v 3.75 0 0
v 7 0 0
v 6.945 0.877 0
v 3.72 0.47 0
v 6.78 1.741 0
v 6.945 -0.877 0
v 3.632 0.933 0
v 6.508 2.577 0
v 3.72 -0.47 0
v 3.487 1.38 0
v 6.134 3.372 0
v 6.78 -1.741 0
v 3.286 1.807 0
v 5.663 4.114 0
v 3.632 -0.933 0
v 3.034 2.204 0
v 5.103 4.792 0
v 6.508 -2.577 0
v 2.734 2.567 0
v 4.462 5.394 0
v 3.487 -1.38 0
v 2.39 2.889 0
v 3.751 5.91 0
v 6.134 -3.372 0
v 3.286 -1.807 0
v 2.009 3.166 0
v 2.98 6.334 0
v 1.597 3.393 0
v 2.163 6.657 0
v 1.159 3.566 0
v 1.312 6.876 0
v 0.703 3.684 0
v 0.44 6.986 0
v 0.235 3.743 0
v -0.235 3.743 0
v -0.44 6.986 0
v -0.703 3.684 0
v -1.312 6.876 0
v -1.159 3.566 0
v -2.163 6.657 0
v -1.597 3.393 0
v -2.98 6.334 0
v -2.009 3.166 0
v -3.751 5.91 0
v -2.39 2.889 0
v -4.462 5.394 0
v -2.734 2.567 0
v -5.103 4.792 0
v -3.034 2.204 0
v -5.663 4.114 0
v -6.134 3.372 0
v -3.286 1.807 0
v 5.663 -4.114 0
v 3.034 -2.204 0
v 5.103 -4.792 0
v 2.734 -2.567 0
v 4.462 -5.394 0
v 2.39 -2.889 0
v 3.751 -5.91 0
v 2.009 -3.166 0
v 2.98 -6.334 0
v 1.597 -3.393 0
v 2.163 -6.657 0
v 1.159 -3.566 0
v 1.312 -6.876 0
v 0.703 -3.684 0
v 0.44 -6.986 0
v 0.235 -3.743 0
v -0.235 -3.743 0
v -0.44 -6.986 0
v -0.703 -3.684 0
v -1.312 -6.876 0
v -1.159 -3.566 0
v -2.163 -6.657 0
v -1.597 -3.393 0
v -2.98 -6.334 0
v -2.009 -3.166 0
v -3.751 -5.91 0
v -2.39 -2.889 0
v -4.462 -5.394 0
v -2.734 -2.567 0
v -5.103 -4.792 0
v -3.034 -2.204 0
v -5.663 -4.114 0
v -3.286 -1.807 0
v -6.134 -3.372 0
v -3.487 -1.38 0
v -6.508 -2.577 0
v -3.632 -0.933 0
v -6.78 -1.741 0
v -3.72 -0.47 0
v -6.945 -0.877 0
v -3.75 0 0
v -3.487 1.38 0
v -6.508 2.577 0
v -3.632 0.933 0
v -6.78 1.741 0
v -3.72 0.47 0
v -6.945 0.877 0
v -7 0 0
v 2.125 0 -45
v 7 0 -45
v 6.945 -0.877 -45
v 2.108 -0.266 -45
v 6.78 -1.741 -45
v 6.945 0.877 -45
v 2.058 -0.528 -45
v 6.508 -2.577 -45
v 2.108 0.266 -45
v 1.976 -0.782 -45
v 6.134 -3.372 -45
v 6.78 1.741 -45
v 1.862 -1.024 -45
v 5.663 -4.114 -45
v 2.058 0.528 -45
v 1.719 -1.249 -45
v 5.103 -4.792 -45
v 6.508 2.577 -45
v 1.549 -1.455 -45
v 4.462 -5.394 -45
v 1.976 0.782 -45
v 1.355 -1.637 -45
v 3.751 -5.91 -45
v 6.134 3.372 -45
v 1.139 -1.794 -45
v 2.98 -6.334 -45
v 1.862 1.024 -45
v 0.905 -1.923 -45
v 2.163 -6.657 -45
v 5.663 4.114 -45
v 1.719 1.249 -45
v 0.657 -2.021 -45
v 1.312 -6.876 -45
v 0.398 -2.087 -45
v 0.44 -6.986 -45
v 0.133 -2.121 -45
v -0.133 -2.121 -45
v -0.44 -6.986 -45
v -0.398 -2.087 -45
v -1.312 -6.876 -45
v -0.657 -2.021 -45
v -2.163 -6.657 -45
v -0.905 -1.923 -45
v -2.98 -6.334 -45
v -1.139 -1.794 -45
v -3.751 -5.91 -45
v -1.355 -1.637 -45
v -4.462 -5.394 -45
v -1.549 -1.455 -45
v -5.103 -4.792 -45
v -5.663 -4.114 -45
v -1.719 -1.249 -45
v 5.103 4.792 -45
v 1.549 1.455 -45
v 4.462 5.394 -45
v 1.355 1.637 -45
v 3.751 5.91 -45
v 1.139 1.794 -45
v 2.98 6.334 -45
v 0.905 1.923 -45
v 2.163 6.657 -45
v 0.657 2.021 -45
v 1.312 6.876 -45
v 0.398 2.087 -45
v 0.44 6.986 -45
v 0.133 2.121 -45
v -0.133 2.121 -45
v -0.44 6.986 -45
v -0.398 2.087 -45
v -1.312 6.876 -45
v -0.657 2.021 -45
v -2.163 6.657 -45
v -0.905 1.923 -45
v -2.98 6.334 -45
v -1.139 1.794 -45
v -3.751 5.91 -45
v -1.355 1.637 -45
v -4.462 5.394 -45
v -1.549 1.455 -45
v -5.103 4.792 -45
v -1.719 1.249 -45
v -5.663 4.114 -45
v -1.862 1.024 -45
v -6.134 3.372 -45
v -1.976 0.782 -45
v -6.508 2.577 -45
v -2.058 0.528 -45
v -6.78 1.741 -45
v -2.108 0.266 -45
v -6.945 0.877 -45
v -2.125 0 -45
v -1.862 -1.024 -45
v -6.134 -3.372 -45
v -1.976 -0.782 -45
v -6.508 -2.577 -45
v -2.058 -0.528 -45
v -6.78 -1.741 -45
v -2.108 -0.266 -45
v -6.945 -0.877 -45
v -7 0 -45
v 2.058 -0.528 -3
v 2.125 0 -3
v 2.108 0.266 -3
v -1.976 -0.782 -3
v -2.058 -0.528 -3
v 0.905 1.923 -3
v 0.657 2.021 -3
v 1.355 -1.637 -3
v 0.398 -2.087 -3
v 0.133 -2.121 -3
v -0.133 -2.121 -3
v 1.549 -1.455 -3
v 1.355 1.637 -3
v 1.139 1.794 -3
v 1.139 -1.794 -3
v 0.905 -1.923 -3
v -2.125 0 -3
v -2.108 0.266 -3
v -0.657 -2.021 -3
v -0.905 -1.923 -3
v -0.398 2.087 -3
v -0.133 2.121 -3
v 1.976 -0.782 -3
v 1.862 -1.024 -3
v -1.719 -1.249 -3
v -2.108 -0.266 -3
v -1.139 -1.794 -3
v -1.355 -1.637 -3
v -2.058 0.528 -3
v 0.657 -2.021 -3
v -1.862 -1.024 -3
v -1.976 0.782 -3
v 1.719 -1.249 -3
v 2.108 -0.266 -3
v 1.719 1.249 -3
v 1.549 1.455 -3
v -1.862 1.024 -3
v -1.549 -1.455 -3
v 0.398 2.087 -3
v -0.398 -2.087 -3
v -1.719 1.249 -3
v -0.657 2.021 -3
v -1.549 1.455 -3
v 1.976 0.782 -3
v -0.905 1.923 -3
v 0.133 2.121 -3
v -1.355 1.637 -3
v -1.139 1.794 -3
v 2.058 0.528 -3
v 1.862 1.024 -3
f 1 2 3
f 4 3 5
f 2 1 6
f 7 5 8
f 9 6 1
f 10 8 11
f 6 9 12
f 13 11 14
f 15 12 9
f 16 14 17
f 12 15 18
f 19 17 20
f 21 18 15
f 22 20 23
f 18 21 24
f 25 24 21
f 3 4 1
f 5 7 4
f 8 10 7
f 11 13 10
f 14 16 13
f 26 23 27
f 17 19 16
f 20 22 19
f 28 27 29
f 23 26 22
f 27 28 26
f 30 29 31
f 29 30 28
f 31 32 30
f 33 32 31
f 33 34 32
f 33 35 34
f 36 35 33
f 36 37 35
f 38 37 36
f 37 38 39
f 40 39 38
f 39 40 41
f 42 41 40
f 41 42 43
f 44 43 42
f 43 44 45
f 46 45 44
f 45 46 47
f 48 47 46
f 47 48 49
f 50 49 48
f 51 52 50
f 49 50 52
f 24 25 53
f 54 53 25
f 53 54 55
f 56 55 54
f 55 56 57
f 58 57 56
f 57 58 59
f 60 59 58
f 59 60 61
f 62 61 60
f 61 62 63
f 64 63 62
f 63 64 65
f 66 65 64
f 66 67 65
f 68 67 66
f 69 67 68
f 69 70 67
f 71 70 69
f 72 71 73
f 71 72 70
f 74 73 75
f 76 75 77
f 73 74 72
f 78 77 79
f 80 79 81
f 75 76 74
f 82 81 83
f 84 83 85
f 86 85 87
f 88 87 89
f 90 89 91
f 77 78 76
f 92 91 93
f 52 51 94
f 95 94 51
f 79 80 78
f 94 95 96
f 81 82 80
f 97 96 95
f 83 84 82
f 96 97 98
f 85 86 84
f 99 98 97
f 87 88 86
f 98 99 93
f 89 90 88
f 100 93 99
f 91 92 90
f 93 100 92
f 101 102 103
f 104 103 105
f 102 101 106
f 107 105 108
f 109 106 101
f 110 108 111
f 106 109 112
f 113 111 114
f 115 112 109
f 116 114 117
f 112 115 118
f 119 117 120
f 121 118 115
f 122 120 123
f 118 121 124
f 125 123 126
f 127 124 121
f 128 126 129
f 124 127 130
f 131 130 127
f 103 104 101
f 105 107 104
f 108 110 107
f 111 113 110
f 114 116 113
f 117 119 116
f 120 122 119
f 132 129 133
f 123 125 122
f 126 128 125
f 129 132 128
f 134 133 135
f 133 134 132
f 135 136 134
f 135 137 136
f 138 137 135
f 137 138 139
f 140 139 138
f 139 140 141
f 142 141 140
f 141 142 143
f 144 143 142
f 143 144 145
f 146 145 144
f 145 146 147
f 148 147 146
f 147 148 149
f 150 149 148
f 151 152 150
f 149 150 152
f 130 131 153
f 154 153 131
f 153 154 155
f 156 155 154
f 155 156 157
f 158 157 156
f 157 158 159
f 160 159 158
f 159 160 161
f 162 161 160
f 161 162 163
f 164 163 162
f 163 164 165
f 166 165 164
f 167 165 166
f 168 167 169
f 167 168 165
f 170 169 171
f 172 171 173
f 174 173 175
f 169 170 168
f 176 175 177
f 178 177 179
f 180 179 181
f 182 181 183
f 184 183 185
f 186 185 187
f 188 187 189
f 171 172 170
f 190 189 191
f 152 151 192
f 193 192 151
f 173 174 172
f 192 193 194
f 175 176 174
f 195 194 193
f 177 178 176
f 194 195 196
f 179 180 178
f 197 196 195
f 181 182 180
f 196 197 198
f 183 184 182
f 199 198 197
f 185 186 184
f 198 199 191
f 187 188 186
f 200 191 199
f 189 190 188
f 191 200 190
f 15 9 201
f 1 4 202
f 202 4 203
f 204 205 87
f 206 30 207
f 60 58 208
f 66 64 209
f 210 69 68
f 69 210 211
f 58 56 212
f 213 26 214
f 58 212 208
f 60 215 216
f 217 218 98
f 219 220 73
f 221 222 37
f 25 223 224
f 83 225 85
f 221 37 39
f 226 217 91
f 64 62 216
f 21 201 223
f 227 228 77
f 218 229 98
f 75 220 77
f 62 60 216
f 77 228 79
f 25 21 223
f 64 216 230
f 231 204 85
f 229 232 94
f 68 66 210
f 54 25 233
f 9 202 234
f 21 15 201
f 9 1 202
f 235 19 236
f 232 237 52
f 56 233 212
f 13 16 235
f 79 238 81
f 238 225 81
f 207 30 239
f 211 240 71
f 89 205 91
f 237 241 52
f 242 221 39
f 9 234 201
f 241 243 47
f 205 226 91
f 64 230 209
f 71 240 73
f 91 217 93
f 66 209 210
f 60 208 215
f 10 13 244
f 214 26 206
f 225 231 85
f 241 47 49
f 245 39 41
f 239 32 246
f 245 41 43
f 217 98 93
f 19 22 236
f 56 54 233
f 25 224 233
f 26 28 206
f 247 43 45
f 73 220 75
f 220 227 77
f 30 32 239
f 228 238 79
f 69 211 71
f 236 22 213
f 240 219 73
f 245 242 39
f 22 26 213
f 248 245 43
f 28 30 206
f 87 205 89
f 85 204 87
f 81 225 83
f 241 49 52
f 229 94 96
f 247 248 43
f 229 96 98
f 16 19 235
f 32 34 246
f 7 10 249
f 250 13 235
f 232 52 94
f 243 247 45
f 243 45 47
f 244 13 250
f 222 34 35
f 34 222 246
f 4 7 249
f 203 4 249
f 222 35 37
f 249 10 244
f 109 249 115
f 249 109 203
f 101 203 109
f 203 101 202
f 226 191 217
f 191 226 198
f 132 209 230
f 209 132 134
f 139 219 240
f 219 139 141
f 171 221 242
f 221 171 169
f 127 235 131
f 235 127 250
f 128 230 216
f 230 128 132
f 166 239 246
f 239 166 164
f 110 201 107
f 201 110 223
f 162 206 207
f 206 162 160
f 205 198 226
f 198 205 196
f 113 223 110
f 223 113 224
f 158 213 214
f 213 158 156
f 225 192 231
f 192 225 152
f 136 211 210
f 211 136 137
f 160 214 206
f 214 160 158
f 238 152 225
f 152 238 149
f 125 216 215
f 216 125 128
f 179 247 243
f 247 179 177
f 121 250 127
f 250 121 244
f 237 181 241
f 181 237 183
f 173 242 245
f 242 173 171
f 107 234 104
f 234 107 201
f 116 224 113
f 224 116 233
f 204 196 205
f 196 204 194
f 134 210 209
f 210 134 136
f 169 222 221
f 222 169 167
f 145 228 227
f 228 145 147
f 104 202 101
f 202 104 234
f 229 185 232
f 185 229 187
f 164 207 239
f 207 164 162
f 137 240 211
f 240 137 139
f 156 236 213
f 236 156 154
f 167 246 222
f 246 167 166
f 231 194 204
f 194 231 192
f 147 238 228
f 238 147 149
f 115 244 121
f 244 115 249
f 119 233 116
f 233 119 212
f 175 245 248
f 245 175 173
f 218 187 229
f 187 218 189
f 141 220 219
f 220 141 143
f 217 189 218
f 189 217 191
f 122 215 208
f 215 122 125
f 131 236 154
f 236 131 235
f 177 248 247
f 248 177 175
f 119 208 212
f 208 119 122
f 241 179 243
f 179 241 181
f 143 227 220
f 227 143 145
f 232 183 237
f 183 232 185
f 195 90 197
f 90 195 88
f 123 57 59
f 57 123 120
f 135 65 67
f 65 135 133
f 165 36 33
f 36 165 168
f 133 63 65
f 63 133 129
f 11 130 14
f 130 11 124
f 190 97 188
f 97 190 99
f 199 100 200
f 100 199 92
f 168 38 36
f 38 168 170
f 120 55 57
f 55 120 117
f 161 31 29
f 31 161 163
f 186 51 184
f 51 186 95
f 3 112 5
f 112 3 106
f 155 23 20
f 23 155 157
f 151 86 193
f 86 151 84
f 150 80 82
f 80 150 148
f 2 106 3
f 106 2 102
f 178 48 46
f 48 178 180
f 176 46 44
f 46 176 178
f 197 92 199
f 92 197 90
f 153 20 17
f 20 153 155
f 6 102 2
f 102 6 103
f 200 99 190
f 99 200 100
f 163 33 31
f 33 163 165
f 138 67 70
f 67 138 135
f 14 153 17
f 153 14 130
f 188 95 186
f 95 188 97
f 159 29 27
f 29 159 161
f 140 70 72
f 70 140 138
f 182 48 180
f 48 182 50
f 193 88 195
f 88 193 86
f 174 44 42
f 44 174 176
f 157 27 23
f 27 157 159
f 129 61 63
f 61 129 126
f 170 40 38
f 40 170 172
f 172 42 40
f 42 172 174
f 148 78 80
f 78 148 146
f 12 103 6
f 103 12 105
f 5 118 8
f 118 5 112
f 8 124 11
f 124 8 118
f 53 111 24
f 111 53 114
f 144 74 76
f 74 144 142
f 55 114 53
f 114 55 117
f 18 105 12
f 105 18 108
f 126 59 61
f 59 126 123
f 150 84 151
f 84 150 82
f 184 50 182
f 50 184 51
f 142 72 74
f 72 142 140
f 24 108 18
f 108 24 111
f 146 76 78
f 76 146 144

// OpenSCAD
$fn = 50;


difference() {
	union() {
		translate(v = [0, 0, -45.0000000000]) {
			cylinder(h = 45, r = 7.0000000000);
		}
		cylinder(h = 0, r = 17.0000000000);
	}
	union() {
		translate(v = [0, 0, 0]) {
			rotate(a = [0, 0, 0]) {
				difference() {
					union() {
						#translate(v = [0, 0, -45.0000000000]) {
							cylinder(h = 45, r = 2.0000000000);
						}
						#translate(v = [0, 0, -3]) {
							cylinder(h = 3, r1 = 2.1250000000, r2 = 3.7500000000);
						}
						#translate(v = [0, 0, -45.0000000000]) {
							cylinder(h = 45, r = 2.1250000000);
						}
						#translate(v = [0, 0, -45.0000000000]) {
							cylinder(h = 45, r = 2.0000000000);
						}
					}
					union();
				}
			}
		}
	}
}
